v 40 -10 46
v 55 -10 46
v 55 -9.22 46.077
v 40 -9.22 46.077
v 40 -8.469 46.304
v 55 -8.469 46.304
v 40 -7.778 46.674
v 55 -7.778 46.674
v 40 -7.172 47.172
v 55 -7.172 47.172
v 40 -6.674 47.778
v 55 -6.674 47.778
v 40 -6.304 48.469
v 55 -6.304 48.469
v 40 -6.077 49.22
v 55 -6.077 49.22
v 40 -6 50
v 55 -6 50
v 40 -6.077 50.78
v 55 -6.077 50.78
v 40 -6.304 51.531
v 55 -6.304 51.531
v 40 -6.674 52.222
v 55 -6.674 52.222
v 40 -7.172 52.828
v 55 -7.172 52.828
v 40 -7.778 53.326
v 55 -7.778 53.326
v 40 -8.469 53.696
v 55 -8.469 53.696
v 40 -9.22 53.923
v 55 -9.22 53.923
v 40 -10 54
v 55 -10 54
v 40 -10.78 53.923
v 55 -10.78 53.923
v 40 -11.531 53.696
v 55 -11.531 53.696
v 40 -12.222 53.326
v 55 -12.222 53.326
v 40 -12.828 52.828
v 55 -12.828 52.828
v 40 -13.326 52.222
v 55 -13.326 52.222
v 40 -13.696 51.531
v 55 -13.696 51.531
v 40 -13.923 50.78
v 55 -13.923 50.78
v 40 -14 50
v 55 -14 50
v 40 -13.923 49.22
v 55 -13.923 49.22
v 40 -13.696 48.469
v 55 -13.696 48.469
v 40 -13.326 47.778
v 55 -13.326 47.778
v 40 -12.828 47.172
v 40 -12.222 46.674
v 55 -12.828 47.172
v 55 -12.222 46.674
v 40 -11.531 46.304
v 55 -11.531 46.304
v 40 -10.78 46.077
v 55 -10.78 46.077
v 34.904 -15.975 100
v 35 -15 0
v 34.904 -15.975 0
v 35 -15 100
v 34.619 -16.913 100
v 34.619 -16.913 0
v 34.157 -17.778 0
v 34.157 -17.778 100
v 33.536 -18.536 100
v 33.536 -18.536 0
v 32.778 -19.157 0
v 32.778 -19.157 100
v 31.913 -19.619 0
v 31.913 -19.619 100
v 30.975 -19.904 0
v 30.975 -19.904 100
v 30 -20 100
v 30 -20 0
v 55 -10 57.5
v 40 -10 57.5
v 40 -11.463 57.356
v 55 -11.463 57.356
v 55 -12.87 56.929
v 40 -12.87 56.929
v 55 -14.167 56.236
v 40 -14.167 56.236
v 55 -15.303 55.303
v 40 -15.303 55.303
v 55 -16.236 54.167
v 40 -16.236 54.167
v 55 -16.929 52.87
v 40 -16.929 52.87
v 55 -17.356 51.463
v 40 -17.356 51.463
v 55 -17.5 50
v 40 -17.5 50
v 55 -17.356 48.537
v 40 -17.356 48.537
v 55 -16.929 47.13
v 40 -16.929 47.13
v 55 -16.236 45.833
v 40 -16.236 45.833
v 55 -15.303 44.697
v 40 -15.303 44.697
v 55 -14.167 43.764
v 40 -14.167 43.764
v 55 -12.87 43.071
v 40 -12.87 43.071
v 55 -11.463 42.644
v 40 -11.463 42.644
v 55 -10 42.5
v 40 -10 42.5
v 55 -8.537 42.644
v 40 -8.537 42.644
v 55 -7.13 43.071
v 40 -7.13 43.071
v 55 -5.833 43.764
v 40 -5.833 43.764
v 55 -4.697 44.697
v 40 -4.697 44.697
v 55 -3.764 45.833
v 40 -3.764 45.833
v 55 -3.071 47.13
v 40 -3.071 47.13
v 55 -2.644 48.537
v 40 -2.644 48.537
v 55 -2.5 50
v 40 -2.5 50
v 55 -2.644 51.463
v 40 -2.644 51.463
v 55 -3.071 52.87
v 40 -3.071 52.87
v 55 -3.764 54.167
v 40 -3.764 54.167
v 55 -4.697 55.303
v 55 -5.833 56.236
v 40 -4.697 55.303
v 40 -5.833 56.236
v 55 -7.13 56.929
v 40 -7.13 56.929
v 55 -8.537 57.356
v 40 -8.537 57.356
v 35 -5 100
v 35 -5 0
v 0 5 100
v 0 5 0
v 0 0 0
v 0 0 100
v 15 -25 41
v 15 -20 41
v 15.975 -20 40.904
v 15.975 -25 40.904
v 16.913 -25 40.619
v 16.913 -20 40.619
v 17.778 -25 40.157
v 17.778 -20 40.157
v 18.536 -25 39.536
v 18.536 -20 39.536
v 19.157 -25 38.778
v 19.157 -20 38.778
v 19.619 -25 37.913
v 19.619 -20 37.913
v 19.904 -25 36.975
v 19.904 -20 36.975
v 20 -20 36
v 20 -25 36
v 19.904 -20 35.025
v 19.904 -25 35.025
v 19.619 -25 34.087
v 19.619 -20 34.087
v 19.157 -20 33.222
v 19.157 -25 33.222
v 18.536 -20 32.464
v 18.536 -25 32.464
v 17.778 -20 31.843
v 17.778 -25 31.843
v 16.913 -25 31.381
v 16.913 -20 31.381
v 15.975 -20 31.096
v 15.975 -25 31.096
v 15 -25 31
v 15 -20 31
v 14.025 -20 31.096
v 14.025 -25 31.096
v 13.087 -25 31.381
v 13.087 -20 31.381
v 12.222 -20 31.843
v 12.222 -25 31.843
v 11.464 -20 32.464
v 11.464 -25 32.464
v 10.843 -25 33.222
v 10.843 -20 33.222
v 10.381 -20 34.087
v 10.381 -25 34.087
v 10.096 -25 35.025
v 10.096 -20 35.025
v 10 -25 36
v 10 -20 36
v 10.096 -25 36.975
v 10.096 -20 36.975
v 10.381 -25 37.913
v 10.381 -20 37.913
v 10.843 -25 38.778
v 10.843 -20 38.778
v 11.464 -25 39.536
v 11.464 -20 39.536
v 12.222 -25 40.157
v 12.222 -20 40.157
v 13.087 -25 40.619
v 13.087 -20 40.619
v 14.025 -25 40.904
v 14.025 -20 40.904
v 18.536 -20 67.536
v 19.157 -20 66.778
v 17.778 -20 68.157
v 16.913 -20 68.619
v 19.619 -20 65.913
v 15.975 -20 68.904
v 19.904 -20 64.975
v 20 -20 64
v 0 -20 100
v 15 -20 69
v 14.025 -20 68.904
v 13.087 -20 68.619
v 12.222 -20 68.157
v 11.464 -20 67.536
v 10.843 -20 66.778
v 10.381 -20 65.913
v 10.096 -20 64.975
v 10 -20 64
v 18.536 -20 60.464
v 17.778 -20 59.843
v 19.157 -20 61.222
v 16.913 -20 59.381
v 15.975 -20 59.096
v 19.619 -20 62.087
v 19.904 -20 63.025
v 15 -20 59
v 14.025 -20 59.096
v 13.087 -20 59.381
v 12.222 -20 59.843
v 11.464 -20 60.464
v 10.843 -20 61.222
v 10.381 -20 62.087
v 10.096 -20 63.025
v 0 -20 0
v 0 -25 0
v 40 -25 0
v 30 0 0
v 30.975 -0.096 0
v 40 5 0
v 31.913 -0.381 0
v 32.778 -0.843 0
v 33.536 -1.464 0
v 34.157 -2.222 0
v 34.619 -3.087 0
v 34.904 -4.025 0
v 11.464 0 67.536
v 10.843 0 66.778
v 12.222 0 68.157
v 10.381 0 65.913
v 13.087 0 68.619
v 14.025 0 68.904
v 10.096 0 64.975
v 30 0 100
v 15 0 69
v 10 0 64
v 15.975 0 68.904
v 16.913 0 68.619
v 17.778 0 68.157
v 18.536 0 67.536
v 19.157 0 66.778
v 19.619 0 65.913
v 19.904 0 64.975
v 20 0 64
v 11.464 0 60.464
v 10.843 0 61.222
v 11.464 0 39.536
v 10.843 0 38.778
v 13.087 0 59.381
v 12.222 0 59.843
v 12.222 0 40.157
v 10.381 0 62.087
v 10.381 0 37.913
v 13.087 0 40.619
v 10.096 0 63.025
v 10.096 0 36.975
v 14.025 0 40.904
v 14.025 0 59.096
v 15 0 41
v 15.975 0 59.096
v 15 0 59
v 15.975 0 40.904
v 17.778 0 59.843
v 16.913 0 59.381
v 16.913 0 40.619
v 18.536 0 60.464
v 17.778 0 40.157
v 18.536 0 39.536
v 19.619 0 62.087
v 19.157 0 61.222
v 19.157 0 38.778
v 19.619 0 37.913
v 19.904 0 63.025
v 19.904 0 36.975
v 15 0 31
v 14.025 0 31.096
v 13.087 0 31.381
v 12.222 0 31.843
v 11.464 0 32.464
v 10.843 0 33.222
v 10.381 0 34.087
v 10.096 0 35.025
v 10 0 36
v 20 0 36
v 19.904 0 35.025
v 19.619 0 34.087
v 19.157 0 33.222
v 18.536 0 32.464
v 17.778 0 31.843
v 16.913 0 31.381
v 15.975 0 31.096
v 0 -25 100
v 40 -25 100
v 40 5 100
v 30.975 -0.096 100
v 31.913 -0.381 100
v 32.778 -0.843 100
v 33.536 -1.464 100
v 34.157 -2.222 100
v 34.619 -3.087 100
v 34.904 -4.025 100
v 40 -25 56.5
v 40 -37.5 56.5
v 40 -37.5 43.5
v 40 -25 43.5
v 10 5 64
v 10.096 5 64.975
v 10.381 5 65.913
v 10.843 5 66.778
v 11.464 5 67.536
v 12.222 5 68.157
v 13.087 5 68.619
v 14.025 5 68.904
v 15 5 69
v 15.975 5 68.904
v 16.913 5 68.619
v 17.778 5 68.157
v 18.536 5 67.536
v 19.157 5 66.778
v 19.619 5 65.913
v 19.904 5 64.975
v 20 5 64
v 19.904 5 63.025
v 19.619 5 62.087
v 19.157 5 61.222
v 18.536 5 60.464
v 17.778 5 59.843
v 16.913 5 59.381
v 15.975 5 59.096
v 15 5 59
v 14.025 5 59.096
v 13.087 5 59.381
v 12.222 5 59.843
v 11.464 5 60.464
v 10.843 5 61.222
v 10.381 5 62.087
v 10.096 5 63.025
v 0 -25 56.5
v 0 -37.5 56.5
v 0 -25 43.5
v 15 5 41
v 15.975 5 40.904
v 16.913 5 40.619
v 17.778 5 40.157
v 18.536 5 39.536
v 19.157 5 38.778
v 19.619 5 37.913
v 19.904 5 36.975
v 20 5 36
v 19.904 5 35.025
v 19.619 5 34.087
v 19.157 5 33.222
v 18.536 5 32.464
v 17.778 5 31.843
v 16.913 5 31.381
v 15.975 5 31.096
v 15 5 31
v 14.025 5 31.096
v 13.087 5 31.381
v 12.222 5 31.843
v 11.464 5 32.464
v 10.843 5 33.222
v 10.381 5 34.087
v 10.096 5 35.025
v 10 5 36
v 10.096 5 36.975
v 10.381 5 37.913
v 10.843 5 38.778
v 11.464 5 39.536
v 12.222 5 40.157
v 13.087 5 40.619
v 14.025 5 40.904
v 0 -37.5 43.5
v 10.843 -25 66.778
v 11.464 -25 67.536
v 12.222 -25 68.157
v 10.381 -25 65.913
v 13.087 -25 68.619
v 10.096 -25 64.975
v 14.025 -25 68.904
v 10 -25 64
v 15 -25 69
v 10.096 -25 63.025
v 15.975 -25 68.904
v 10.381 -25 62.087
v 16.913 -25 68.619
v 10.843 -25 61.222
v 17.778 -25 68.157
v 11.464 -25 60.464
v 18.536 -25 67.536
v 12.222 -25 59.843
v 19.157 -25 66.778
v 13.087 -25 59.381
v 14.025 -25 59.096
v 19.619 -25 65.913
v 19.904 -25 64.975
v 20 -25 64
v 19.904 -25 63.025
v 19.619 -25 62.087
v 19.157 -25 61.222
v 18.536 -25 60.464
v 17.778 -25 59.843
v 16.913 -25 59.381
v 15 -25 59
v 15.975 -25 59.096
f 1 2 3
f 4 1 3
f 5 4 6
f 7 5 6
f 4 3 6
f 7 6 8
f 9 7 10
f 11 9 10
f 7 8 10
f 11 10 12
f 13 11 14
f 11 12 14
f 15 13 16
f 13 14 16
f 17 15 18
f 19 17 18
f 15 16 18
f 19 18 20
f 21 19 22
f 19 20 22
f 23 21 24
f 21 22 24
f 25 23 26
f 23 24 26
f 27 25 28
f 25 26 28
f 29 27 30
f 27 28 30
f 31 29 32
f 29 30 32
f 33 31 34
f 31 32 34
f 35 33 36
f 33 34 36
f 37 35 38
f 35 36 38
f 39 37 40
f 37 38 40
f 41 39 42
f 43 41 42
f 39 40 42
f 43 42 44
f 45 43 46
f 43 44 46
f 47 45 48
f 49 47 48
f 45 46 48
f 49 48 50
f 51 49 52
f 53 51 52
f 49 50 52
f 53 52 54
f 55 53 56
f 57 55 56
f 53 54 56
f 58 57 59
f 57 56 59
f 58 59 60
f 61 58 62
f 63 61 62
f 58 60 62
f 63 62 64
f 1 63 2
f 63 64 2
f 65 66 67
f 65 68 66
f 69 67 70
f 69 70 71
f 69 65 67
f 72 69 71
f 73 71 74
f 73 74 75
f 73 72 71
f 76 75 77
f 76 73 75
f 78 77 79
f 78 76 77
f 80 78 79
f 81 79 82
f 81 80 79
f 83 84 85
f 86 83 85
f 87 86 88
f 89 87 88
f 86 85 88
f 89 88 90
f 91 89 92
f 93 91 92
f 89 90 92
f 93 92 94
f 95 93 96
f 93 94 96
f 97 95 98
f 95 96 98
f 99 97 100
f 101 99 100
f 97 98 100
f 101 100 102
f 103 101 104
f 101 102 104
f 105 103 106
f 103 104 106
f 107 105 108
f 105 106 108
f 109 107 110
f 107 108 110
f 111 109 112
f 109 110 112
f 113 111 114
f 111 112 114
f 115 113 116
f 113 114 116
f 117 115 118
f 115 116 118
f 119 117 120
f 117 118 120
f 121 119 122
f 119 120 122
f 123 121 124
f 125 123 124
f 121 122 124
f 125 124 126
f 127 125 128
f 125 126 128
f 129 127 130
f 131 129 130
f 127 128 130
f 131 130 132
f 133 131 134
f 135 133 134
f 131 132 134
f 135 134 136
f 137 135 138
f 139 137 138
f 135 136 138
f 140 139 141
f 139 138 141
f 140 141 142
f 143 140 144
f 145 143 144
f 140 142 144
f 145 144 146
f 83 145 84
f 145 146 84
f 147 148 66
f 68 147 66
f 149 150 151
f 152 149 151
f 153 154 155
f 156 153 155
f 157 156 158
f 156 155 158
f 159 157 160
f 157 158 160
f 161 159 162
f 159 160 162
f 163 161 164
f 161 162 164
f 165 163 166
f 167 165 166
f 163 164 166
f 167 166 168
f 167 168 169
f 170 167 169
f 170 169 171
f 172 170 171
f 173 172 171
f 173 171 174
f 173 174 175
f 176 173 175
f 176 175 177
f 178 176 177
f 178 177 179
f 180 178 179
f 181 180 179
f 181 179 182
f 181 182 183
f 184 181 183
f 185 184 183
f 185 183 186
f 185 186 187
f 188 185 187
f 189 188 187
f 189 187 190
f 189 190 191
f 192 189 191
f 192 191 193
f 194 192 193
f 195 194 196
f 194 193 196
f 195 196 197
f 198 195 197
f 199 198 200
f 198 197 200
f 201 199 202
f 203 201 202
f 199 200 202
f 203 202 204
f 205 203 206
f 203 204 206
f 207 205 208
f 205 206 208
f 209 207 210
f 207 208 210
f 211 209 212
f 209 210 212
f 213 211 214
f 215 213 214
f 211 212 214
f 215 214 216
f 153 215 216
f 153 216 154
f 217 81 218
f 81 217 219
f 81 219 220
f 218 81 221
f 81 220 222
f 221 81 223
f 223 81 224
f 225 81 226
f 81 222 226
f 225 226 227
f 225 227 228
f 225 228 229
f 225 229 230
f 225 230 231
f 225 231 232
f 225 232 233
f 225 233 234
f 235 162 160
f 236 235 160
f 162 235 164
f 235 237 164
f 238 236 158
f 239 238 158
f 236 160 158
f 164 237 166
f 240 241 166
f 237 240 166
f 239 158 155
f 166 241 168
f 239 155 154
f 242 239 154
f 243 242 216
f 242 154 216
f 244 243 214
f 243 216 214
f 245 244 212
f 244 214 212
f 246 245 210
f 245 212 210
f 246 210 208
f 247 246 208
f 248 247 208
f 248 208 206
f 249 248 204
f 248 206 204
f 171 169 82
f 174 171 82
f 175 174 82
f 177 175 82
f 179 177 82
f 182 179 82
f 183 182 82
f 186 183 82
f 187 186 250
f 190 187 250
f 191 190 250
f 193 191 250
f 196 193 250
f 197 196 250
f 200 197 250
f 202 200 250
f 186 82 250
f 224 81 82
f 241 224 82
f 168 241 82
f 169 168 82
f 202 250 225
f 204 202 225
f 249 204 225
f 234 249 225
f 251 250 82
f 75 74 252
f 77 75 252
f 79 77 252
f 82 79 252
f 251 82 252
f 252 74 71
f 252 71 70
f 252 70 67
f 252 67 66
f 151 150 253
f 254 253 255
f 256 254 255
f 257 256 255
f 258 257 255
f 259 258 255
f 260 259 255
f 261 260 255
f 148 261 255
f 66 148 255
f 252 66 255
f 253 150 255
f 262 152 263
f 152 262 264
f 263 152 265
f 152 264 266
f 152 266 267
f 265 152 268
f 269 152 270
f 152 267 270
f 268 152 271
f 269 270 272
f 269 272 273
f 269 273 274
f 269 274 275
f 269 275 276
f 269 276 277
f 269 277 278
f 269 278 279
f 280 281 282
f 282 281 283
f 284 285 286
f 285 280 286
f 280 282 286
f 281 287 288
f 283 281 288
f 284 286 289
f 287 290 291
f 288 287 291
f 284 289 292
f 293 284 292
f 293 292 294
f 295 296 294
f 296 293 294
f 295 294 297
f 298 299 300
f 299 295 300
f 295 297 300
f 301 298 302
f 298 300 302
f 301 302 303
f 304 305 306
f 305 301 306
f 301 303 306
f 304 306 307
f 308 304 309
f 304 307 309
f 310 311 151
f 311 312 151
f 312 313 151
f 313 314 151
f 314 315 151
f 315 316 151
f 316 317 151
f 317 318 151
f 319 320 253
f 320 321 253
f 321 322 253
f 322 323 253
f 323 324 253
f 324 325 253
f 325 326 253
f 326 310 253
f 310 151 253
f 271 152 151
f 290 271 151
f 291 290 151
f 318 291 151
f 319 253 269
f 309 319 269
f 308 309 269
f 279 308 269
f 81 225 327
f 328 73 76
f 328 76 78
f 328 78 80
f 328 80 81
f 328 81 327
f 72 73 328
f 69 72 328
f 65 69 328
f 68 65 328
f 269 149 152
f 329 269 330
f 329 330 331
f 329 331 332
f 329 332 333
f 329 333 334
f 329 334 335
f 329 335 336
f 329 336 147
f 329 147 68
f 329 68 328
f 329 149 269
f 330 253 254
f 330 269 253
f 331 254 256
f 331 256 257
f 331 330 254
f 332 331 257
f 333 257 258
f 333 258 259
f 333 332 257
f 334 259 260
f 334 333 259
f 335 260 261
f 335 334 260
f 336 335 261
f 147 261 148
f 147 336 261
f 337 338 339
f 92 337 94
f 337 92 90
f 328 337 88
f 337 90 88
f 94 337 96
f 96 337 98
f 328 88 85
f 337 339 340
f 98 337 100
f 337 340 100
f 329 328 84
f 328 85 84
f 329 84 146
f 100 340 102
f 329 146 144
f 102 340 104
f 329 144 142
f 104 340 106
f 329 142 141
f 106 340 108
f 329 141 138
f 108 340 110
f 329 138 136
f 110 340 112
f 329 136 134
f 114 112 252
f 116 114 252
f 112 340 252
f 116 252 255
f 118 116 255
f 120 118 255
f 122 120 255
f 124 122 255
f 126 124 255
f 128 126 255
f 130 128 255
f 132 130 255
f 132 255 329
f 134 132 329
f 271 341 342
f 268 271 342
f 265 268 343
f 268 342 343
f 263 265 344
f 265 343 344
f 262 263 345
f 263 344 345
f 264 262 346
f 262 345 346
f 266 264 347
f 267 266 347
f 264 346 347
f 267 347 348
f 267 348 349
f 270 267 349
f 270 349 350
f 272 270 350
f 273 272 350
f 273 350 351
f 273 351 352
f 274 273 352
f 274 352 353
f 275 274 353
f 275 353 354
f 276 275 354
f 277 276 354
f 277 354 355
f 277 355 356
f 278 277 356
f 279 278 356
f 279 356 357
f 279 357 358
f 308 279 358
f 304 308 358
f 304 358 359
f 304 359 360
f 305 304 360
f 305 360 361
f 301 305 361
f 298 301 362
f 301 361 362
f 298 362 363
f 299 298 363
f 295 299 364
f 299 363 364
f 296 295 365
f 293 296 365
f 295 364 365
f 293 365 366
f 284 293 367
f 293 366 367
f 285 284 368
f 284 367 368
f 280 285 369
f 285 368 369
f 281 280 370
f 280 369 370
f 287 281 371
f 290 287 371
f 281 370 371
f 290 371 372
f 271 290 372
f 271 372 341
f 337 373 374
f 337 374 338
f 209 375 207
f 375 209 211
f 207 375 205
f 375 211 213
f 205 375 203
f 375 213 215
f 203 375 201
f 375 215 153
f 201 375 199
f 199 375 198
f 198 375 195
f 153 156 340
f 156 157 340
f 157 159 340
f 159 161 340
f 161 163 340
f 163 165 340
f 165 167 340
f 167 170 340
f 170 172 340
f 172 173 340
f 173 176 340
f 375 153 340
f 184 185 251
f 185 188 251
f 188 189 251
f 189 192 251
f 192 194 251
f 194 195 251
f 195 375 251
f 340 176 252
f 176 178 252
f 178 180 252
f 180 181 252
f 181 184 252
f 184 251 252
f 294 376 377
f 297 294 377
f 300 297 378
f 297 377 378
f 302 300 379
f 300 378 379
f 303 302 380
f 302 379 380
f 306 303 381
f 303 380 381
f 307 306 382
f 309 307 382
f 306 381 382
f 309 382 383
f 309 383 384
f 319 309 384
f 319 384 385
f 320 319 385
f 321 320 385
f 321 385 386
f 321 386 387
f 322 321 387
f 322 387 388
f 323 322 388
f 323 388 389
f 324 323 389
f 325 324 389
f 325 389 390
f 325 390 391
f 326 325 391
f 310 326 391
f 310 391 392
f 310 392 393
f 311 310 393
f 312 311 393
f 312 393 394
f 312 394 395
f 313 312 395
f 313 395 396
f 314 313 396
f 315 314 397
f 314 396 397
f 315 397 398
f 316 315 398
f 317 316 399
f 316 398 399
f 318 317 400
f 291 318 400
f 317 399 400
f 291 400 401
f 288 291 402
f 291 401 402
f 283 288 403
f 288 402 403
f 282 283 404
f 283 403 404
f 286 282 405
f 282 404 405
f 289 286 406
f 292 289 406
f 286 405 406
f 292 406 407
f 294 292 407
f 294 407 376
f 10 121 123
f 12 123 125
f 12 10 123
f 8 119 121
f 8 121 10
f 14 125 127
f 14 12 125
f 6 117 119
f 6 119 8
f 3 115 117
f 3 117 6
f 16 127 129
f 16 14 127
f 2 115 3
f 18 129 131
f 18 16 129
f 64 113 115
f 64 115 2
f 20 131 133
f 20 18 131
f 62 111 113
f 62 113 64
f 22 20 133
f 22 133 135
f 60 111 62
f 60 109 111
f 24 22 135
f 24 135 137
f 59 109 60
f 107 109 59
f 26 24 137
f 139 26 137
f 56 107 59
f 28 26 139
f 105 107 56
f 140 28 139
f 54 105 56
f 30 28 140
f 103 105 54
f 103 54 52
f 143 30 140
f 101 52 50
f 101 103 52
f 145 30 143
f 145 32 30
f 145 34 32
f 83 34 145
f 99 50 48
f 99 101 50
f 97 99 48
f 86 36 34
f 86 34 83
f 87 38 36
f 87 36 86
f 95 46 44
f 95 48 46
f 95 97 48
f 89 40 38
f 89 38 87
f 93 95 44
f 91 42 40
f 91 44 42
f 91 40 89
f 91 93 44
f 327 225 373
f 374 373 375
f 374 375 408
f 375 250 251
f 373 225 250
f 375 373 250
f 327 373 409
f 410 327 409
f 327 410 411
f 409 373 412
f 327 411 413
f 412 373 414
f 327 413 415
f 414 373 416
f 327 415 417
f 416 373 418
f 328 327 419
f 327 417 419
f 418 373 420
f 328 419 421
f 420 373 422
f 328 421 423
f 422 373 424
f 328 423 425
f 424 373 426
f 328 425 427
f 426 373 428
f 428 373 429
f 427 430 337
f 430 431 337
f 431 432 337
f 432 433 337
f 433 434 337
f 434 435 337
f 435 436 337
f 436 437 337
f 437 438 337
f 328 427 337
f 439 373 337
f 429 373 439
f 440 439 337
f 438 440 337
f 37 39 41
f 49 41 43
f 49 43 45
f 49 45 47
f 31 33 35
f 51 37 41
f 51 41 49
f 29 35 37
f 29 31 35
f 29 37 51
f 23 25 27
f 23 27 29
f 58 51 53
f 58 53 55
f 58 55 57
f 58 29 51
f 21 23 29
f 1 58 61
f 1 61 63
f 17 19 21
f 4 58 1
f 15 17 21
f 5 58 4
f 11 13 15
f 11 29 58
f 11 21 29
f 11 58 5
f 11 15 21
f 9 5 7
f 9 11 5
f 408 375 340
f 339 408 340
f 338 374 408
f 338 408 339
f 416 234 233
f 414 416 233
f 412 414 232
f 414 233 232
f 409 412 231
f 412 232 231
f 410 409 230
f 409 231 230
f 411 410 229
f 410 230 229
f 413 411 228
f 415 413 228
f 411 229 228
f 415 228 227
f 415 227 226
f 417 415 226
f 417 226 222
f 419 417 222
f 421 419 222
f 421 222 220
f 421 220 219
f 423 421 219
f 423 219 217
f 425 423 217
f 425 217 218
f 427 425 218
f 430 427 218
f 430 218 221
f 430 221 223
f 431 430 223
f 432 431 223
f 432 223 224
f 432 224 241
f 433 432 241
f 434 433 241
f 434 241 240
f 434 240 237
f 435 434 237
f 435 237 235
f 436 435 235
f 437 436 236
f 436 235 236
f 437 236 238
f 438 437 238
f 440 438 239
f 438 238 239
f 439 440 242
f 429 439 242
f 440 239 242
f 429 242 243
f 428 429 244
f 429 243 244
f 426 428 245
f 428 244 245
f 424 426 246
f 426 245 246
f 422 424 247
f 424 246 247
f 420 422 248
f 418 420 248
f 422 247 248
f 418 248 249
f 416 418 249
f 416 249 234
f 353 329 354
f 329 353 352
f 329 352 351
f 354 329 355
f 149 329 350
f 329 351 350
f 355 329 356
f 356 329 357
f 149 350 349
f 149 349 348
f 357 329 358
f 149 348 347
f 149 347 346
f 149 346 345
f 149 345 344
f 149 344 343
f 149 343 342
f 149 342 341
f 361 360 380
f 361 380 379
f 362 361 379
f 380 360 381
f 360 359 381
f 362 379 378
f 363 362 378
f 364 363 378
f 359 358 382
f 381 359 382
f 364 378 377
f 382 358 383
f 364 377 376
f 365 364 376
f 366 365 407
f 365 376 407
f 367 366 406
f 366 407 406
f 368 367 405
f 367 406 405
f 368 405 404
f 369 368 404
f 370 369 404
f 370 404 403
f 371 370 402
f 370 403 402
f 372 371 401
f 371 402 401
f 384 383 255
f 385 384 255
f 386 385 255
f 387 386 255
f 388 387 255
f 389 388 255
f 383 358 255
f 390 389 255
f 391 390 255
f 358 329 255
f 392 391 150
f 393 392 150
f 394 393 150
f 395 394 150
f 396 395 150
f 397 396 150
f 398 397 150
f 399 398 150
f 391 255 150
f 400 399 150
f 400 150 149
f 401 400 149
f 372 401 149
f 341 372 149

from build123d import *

# Parameters (mm, degrees)
BOSS_EXTRUDE1_DEPTH = 100
FILLET1_R           = 5
SKETCH2_R           = 5
CUT_EXTRUDE1_DEPTH  = 75
SKETCH3_W           = 40
SKETCH3_H           = 13
BOSS_EXTRUDE2_DEPTH = 12.5
SKETCH9_R           = 7.5
BOSS_EXTRUDE6_DEPTH = 15
SKETCH10_R          = 4
CUT_EXTRUDE3_DEPTH  = 15


with BuildPart() as part:
    # Sketch1 → Boss-Extrude1 (new body)
    with BuildSketch(Plane.XY):
        Polygon((0, 0), (35, 0), (35, -20), (0, -20), (0, -25), (40, -25), (40, 5), (0, 5), align=None)
    extrude(amount=BOSS_EXTRUDE1_DEPTH)

    # Fillet1
    fillet1_edges = [part.edges().sort_by_distance(p)[0] for p in [
        (35, -20, 50),
        (35, 0, 50),
    ]]
    fillet(fillet1_edges, radius=FILLET1_R)

    # Sketch2 → Cut-Extrude1 (cut)
    with BuildSketch(Plane(origin=(0, 5, 0), x_dir=(1, 0, 0), z_dir=(0, 1, 0))):
        with Locations(Location((15, -64, 0), (0, 0, 180))):
            Circle(SKETCH2_R)
        with Locations(Location((15, -36, 0), (0, 0, 270))):
            Circle(SKETCH2_R)
    extrude(amount=-CUT_EXTRUDE1_DEPTH, mode=Mode.SUBTRACT)

    # Sketch3 → Boss-Extrude2 (add)
    with BuildSketch(Plane.XZ.offset(25)):
        with Locations((20, 50)):
            Rectangle(SKETCH3_W, SKETCH3_H)
    extrude(amount=BOSS_EXTRUDE2_DEPTH)

    # Sketch9 → Boss-Extrude6 (add)
    with BuildSketch(Plane(origin=(40, 0, 0), x_dir=(0, 0, -1), z_dir=(1, 0, 0))):
        with Locations(Location((-50, -10, 0), (0, 0, 180))):
            Circle(SKETCH9_R)
    extrude(amount=BOSS_EXTRUDE6_DEPTH)

    # Sketch10 → Cut-Extrude3 (cut)
    with BuildSketch(Plane(origin=(55, 0, 0), x_dir=(0, 0, -1), z_dir=(1, 0, 0))):
        with Locations((-50, -10)):
            Circle(SKETCH10_R)
    extrude(amount=-CUT_EXTRUDE3_DEPTH, mode=Mode.SUBTRACT)


solid = part.part
